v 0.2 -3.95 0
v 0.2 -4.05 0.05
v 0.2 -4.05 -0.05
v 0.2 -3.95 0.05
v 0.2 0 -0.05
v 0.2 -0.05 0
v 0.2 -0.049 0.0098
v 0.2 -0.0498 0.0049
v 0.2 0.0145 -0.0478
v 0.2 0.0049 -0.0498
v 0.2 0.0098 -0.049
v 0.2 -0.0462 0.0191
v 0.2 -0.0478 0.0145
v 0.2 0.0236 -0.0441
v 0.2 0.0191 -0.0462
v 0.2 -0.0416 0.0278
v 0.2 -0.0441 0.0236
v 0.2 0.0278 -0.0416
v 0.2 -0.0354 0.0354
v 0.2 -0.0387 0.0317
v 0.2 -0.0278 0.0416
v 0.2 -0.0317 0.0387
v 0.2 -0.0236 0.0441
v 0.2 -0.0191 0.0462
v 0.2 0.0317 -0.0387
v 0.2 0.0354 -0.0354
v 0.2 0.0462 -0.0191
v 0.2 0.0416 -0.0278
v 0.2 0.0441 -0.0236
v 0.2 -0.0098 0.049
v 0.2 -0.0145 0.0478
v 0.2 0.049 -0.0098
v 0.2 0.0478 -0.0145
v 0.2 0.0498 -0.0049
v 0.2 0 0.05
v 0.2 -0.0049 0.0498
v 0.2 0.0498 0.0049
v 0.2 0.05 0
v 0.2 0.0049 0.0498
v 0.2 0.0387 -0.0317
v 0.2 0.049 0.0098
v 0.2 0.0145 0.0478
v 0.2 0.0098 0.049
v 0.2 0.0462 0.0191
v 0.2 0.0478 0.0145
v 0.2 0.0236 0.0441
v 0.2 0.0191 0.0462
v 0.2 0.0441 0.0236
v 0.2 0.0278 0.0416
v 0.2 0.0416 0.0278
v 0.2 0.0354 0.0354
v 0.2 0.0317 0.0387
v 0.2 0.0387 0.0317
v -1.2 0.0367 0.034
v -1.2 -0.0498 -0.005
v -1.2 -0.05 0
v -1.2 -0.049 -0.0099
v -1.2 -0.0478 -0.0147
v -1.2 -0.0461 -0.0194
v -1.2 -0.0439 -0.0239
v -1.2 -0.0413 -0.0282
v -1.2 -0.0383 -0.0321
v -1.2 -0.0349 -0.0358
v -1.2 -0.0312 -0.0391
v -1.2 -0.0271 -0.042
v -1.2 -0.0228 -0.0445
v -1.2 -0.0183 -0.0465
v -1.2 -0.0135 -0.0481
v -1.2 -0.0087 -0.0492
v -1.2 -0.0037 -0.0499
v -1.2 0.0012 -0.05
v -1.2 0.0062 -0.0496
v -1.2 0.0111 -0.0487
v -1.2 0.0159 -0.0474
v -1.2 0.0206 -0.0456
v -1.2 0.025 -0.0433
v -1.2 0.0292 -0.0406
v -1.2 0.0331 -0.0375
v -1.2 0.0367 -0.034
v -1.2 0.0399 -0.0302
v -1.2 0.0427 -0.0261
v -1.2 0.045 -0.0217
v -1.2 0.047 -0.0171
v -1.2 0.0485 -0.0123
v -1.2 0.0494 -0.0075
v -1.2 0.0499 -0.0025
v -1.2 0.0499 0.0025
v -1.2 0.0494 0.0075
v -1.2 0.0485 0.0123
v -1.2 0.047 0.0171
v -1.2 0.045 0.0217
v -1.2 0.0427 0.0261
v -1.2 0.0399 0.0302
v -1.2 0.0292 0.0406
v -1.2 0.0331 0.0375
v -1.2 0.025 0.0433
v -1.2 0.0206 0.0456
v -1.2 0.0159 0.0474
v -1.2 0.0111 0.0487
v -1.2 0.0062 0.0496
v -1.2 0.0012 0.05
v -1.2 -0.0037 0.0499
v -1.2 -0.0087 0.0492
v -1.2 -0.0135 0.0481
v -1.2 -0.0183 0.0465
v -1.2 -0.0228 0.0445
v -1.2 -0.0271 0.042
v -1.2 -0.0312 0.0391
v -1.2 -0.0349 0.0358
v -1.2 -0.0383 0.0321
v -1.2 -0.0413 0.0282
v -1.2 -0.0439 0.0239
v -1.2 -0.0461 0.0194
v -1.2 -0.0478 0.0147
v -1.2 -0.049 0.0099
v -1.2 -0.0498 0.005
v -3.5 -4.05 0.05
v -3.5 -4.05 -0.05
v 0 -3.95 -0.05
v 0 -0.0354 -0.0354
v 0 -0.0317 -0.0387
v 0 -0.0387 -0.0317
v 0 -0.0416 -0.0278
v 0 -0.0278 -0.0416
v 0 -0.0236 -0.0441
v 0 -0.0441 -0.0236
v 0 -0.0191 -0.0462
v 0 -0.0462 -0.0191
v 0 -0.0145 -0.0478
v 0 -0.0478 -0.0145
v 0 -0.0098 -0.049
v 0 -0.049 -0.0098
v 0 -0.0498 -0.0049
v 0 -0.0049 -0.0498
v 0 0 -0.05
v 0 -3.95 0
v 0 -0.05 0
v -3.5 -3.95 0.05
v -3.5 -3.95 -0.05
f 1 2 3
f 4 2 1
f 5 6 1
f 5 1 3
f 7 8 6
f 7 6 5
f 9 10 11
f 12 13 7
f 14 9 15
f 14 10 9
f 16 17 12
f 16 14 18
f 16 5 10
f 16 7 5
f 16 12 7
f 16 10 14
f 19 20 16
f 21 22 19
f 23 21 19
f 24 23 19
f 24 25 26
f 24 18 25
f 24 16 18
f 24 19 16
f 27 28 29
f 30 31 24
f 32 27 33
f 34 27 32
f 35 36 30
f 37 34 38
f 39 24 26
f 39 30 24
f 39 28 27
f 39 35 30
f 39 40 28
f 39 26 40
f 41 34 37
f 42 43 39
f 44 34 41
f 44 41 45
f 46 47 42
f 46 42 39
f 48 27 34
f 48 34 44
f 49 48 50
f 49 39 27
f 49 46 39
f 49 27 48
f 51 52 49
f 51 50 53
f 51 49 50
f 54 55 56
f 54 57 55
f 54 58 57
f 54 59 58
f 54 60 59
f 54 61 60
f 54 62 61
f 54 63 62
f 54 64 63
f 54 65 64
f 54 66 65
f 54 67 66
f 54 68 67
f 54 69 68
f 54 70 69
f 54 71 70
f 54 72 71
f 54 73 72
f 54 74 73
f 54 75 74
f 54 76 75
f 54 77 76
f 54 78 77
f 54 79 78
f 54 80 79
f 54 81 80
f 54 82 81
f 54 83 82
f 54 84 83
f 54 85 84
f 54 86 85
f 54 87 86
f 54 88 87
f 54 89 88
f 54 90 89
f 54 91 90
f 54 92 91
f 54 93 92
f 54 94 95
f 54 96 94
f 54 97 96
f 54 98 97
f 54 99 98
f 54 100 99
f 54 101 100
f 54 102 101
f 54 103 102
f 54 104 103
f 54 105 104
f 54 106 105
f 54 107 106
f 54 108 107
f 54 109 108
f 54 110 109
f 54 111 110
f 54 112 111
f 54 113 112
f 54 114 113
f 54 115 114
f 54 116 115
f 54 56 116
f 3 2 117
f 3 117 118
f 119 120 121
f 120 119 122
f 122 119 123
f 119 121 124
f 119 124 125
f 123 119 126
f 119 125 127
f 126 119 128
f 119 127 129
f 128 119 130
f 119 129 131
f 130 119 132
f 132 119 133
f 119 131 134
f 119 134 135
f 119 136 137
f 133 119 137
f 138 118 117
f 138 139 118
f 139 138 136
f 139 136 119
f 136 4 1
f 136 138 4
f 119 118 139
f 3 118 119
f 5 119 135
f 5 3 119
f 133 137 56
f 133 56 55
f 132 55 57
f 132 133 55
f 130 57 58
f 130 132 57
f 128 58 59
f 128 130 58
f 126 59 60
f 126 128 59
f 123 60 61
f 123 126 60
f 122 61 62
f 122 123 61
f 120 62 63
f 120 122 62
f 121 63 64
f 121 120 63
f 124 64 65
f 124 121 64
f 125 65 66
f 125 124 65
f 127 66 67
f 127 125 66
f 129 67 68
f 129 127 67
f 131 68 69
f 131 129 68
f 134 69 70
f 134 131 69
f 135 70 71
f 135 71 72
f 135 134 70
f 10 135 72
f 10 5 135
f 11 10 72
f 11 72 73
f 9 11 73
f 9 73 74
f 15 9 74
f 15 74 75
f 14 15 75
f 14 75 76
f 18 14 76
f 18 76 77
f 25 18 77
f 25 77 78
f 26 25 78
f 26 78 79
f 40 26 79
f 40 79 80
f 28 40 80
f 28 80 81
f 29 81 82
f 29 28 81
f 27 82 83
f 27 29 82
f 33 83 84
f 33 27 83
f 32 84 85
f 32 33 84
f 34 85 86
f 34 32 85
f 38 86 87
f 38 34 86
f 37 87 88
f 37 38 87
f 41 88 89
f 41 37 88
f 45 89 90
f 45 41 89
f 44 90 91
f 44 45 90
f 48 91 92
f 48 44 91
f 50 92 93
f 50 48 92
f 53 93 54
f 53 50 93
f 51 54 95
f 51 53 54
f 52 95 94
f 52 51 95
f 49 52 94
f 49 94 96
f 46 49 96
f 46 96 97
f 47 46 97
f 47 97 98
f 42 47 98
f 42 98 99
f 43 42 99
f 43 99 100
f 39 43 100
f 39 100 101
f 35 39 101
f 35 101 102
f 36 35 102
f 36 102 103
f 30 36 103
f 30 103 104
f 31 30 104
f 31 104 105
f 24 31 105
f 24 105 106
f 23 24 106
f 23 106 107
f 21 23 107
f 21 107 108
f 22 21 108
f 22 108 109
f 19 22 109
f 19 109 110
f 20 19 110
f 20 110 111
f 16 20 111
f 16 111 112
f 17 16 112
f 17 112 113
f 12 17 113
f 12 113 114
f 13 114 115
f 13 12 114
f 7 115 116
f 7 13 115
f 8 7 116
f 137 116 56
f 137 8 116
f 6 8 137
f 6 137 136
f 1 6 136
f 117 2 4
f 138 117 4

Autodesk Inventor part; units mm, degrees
ref_plane "YZ Plane" through (0, 0, 0) normal (1, 0, 0) x (0, 1, 0)
ref_plane "XZ Plane" through (0, 0, 0) normal (0, 1, 0) x (-1, 0, 0)
ref_plane "XY Plane" through (0, 0, 0) normal (0, 0, 1) x (1, 0, 0)
sketch "Sketch1" plane through (0, 0, 0) normal (1, 0, 0) x (0, 1, 0)
  circle A0 centre (0, 0) radius 0.05
  line L0 (0, 0) -> (-4, 0)
  line L1 (-4.05, 0.05) -> (-3.95, 0.05)
  line L2 (-3.95, 0.05) -> (-3.95, -0.05)
  line L3 (-3.95, -0.05) -> (-4.05, -0.05)
  line L4 (-4.05, -0.05) -> (-4.05, 0.05)
  line L5 (-4.05, 0.05) -> (-3.95, -0.05) construction
  line L6 (-3.95, 0.05) -> (-4.05, -0.05) construction
  line L7 (-3.95, -0.05) -> (0, -0.05)
  point P0 (-0.05, 0)
  point P1 (-3.95, 0)
  dimension "d0" = 0.1
  dimension "d1" = 4
  dimension "d2" = 0.1
  dimension "d3" = 0.1
extrude "Extrusion1" add sketch "Sketch1" along normal blind 0.2
sketch "Sketch2" plane through (0, 0, 0) normal (-1, 0, 0) x (0, 0, 1)
  arc A0 (0, -0.05) -> (-0.05, 0) centre (0, 0) ccw projected
  circle A1 centre (0, 0) radius 0.05
  point P0 (-0.05, 0)
  point P1 (0, -0.05)
  dimension "d6" = 0.1
extrude "Extrusion2" add sketch "Sketch2" along normal blind 1.2
sketch "Sketch3" plane through (0, 0, 0) normal (-1, 0, 0) x (0, 0, 1)
  line L0 (-0.05, -4.05) -> (-0.05, 0) projected
  line L1 (0.05, -4.05) -> (-0.05, -4.05) projected
  line L2 (-0.05, -4.05) -> (0.05, -4.05)
  line L3 (0, -3.95) -> (0.05, -3.95) projected
  line L4 (0.05, -4.05) -> (0.05, -3.95)
  line L5 (0.05, -3.95) -> (-0.05, -3.95)
  line L6 (-0.05, -3.95) -> (-0.05, -4.05)
  point P0 (0, 0)
extrude "Extrusion3" add sketch "Sketch3" along normal blind 3.5
properties part number "Bone26_25_Fix"
